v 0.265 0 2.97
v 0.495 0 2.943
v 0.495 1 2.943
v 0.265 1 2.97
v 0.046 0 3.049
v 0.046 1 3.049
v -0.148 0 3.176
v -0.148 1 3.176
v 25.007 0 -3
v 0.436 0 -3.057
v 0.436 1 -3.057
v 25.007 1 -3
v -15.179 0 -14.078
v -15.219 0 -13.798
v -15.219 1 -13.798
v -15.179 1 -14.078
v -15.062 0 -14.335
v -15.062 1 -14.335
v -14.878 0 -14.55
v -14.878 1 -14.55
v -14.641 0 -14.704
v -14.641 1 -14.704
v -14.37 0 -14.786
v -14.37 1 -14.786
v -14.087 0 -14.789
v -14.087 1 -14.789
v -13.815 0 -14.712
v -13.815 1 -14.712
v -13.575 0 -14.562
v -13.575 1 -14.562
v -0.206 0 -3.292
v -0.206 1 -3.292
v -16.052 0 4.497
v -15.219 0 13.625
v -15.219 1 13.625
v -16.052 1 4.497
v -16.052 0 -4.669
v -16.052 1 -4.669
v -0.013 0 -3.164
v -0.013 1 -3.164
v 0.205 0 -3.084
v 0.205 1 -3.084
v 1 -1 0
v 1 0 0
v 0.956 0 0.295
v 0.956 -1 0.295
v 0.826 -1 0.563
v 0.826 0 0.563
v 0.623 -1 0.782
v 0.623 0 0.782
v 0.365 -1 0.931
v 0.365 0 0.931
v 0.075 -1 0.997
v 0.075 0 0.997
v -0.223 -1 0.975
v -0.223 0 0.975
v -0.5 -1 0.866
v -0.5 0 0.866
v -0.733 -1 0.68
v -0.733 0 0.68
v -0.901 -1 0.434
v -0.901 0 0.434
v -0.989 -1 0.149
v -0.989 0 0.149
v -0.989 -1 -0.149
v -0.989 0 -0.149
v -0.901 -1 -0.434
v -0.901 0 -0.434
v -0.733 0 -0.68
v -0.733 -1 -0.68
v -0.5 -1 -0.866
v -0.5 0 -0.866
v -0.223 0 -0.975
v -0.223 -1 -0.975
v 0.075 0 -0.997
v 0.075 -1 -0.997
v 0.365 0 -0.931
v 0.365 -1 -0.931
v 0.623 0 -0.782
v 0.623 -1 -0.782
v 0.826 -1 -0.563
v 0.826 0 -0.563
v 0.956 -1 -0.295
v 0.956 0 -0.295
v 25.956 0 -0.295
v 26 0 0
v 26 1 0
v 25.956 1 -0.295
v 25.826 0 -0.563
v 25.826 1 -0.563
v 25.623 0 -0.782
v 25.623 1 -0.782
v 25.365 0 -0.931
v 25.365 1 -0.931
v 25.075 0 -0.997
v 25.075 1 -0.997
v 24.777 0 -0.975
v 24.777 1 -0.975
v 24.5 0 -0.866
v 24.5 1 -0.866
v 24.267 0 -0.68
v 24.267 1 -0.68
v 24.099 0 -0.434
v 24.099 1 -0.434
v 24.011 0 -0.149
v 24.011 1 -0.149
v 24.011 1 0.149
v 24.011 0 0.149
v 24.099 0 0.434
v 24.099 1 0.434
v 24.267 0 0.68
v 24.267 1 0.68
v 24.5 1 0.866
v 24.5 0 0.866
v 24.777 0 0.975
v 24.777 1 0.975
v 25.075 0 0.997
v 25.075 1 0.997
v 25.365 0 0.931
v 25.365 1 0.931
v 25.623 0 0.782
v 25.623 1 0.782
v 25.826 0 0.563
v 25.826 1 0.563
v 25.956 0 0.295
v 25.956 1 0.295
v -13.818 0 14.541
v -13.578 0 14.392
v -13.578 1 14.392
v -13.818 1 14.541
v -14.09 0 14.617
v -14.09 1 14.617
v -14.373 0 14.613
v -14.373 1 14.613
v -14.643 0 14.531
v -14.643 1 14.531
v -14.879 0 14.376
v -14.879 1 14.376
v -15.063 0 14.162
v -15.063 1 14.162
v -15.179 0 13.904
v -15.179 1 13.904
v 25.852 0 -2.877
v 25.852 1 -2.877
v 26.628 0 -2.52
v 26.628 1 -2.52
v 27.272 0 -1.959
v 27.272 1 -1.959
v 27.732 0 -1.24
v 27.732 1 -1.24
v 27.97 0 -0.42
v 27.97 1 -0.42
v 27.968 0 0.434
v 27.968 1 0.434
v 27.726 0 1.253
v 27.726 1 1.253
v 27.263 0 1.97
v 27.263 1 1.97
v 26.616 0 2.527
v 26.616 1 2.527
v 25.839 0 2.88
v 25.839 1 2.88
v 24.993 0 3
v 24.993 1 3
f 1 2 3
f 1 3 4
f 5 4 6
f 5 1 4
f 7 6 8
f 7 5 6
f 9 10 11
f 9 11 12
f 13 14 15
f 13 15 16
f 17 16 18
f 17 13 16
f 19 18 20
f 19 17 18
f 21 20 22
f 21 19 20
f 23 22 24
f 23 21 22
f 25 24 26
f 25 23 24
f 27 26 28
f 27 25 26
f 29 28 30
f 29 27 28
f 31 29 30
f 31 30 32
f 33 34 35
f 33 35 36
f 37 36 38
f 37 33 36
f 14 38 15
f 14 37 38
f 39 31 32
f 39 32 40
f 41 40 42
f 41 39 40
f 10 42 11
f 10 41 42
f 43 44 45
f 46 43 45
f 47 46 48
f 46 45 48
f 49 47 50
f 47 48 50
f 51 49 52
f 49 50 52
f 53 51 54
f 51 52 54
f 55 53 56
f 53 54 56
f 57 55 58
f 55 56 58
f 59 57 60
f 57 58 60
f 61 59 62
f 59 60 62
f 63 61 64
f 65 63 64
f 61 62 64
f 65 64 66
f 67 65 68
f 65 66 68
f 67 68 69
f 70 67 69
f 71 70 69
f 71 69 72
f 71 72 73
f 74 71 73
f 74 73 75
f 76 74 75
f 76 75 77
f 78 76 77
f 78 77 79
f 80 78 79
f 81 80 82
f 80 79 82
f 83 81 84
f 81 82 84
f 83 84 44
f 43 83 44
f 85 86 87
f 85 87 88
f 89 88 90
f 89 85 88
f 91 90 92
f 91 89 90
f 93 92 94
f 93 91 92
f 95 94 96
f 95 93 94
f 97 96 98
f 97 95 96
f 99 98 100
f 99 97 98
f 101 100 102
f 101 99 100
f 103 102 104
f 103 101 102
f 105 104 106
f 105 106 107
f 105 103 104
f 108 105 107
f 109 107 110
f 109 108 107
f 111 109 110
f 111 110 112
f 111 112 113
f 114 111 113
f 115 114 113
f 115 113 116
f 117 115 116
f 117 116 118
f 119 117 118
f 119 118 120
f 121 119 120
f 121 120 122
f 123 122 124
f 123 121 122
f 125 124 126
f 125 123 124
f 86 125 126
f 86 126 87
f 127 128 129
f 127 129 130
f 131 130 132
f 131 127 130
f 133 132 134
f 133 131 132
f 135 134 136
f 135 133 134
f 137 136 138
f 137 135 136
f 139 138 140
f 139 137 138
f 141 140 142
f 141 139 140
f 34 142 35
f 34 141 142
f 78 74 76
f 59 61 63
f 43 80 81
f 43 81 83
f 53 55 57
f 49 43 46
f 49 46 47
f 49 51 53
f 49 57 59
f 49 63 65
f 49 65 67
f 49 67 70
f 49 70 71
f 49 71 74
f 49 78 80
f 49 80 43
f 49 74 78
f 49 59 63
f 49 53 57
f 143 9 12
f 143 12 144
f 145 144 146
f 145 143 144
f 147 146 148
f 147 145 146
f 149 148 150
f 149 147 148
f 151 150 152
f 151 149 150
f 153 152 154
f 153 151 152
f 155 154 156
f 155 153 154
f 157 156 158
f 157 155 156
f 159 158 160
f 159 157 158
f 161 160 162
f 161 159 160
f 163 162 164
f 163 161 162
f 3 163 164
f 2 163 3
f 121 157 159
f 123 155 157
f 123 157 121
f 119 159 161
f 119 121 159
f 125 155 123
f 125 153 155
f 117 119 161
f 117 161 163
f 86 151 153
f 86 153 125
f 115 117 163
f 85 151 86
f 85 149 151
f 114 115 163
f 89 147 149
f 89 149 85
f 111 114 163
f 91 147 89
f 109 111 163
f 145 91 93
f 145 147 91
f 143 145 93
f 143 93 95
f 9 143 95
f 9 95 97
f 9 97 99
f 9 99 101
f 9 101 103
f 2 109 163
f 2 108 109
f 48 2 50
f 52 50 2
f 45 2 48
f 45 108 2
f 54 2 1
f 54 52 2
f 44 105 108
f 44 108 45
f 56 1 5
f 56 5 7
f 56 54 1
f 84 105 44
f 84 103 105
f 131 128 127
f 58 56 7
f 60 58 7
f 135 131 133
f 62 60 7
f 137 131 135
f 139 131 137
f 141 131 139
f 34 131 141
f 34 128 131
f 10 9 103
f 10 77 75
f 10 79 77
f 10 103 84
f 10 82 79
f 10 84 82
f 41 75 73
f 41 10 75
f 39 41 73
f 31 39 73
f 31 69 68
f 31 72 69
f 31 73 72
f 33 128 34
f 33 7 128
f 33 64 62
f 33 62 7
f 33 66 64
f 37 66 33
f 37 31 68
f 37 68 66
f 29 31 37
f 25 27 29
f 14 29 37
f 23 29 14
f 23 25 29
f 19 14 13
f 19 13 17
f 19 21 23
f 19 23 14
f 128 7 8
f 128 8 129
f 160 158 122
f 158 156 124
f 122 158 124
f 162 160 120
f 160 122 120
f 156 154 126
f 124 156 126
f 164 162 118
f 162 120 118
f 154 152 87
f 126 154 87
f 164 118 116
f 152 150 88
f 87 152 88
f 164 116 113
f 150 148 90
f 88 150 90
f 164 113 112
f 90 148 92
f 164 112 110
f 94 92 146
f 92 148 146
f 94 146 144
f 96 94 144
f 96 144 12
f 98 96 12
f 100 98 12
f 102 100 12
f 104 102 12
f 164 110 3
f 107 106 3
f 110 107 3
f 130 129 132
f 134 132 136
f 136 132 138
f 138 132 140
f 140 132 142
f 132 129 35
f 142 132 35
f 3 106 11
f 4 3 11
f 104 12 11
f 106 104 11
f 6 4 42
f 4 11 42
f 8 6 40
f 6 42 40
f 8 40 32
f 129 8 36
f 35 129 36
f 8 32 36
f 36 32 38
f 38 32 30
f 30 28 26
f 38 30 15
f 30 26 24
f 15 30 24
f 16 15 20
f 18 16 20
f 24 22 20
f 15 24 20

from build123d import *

# Parameters (mm, degrees)
SKETCH1_R           = 1
BOSS_EXTRUDE3_DEPTH = 1
SKETCH3_R           = 1
BOSS_EXTRUDE4_DEPTH = 1


with BuildPart() as part:
    # Sketch1 → Boss-Extrude3 (new body)
    with BuildSketch(Plane(origin=(0, 0, 0), x_dir=(1, 0, 0), z_dir=(0, 1, 0))):
        with BuildLine():
            Line((0.435948957, 3.056735566), (25.006928102, 2.999992))
            ThreePointArc((25.006928102, 2.999992), (27.999992, -0.006928102), (24.993071898, -2.999992))
            Line((24.993071898, -2.999992), (0.495326263, -2.943417558))
            ThreePointArc((0.495326263, -2.943417558), (0.15316776, -3.002934926), (-0.147999921, -3.175888058))
            Line((-0.147999921, -3.175888058), (-13.578162843, -14.392382292))
            ThreePointArc((-13.578162843, -14.392382292), (-14.642844141, -14.530674651), (-15.219179661, -13.624855459))
            ThreePointArc((-15.219179661, -13.624855459), (-16.155963413, 0.086416086), (-15.219179661, 13.797687632))
            ThreePointArc((-15.219179661, 13.797687632), (-14.640751142, 14.704482805), (-13.574624688, 14.562245599))
            Line((-13.574624688, 14.562245599), (-0.206296649, 3.292174932))
            ThreePointArc((-0.206296649, 3.292174932), (0.094068998, 3.117832635), (0.435948957, 3.056735566))
        make_face()
        with Locations((25, 0)):
            Circle(SKETCH1_R, mode=Mode.SUBTRACT)
    extrude(amount=BOSS_EXTRUDE3_DEPTH)

    # Sketch3 → Boss-Extrude4 (add)
    with BuildSketch(Plane.XZ):
        Circle(SKETCH3_R)
    extrude(amount=BOSS_EXTRUDE4_DEPTH)


solid = part.part
